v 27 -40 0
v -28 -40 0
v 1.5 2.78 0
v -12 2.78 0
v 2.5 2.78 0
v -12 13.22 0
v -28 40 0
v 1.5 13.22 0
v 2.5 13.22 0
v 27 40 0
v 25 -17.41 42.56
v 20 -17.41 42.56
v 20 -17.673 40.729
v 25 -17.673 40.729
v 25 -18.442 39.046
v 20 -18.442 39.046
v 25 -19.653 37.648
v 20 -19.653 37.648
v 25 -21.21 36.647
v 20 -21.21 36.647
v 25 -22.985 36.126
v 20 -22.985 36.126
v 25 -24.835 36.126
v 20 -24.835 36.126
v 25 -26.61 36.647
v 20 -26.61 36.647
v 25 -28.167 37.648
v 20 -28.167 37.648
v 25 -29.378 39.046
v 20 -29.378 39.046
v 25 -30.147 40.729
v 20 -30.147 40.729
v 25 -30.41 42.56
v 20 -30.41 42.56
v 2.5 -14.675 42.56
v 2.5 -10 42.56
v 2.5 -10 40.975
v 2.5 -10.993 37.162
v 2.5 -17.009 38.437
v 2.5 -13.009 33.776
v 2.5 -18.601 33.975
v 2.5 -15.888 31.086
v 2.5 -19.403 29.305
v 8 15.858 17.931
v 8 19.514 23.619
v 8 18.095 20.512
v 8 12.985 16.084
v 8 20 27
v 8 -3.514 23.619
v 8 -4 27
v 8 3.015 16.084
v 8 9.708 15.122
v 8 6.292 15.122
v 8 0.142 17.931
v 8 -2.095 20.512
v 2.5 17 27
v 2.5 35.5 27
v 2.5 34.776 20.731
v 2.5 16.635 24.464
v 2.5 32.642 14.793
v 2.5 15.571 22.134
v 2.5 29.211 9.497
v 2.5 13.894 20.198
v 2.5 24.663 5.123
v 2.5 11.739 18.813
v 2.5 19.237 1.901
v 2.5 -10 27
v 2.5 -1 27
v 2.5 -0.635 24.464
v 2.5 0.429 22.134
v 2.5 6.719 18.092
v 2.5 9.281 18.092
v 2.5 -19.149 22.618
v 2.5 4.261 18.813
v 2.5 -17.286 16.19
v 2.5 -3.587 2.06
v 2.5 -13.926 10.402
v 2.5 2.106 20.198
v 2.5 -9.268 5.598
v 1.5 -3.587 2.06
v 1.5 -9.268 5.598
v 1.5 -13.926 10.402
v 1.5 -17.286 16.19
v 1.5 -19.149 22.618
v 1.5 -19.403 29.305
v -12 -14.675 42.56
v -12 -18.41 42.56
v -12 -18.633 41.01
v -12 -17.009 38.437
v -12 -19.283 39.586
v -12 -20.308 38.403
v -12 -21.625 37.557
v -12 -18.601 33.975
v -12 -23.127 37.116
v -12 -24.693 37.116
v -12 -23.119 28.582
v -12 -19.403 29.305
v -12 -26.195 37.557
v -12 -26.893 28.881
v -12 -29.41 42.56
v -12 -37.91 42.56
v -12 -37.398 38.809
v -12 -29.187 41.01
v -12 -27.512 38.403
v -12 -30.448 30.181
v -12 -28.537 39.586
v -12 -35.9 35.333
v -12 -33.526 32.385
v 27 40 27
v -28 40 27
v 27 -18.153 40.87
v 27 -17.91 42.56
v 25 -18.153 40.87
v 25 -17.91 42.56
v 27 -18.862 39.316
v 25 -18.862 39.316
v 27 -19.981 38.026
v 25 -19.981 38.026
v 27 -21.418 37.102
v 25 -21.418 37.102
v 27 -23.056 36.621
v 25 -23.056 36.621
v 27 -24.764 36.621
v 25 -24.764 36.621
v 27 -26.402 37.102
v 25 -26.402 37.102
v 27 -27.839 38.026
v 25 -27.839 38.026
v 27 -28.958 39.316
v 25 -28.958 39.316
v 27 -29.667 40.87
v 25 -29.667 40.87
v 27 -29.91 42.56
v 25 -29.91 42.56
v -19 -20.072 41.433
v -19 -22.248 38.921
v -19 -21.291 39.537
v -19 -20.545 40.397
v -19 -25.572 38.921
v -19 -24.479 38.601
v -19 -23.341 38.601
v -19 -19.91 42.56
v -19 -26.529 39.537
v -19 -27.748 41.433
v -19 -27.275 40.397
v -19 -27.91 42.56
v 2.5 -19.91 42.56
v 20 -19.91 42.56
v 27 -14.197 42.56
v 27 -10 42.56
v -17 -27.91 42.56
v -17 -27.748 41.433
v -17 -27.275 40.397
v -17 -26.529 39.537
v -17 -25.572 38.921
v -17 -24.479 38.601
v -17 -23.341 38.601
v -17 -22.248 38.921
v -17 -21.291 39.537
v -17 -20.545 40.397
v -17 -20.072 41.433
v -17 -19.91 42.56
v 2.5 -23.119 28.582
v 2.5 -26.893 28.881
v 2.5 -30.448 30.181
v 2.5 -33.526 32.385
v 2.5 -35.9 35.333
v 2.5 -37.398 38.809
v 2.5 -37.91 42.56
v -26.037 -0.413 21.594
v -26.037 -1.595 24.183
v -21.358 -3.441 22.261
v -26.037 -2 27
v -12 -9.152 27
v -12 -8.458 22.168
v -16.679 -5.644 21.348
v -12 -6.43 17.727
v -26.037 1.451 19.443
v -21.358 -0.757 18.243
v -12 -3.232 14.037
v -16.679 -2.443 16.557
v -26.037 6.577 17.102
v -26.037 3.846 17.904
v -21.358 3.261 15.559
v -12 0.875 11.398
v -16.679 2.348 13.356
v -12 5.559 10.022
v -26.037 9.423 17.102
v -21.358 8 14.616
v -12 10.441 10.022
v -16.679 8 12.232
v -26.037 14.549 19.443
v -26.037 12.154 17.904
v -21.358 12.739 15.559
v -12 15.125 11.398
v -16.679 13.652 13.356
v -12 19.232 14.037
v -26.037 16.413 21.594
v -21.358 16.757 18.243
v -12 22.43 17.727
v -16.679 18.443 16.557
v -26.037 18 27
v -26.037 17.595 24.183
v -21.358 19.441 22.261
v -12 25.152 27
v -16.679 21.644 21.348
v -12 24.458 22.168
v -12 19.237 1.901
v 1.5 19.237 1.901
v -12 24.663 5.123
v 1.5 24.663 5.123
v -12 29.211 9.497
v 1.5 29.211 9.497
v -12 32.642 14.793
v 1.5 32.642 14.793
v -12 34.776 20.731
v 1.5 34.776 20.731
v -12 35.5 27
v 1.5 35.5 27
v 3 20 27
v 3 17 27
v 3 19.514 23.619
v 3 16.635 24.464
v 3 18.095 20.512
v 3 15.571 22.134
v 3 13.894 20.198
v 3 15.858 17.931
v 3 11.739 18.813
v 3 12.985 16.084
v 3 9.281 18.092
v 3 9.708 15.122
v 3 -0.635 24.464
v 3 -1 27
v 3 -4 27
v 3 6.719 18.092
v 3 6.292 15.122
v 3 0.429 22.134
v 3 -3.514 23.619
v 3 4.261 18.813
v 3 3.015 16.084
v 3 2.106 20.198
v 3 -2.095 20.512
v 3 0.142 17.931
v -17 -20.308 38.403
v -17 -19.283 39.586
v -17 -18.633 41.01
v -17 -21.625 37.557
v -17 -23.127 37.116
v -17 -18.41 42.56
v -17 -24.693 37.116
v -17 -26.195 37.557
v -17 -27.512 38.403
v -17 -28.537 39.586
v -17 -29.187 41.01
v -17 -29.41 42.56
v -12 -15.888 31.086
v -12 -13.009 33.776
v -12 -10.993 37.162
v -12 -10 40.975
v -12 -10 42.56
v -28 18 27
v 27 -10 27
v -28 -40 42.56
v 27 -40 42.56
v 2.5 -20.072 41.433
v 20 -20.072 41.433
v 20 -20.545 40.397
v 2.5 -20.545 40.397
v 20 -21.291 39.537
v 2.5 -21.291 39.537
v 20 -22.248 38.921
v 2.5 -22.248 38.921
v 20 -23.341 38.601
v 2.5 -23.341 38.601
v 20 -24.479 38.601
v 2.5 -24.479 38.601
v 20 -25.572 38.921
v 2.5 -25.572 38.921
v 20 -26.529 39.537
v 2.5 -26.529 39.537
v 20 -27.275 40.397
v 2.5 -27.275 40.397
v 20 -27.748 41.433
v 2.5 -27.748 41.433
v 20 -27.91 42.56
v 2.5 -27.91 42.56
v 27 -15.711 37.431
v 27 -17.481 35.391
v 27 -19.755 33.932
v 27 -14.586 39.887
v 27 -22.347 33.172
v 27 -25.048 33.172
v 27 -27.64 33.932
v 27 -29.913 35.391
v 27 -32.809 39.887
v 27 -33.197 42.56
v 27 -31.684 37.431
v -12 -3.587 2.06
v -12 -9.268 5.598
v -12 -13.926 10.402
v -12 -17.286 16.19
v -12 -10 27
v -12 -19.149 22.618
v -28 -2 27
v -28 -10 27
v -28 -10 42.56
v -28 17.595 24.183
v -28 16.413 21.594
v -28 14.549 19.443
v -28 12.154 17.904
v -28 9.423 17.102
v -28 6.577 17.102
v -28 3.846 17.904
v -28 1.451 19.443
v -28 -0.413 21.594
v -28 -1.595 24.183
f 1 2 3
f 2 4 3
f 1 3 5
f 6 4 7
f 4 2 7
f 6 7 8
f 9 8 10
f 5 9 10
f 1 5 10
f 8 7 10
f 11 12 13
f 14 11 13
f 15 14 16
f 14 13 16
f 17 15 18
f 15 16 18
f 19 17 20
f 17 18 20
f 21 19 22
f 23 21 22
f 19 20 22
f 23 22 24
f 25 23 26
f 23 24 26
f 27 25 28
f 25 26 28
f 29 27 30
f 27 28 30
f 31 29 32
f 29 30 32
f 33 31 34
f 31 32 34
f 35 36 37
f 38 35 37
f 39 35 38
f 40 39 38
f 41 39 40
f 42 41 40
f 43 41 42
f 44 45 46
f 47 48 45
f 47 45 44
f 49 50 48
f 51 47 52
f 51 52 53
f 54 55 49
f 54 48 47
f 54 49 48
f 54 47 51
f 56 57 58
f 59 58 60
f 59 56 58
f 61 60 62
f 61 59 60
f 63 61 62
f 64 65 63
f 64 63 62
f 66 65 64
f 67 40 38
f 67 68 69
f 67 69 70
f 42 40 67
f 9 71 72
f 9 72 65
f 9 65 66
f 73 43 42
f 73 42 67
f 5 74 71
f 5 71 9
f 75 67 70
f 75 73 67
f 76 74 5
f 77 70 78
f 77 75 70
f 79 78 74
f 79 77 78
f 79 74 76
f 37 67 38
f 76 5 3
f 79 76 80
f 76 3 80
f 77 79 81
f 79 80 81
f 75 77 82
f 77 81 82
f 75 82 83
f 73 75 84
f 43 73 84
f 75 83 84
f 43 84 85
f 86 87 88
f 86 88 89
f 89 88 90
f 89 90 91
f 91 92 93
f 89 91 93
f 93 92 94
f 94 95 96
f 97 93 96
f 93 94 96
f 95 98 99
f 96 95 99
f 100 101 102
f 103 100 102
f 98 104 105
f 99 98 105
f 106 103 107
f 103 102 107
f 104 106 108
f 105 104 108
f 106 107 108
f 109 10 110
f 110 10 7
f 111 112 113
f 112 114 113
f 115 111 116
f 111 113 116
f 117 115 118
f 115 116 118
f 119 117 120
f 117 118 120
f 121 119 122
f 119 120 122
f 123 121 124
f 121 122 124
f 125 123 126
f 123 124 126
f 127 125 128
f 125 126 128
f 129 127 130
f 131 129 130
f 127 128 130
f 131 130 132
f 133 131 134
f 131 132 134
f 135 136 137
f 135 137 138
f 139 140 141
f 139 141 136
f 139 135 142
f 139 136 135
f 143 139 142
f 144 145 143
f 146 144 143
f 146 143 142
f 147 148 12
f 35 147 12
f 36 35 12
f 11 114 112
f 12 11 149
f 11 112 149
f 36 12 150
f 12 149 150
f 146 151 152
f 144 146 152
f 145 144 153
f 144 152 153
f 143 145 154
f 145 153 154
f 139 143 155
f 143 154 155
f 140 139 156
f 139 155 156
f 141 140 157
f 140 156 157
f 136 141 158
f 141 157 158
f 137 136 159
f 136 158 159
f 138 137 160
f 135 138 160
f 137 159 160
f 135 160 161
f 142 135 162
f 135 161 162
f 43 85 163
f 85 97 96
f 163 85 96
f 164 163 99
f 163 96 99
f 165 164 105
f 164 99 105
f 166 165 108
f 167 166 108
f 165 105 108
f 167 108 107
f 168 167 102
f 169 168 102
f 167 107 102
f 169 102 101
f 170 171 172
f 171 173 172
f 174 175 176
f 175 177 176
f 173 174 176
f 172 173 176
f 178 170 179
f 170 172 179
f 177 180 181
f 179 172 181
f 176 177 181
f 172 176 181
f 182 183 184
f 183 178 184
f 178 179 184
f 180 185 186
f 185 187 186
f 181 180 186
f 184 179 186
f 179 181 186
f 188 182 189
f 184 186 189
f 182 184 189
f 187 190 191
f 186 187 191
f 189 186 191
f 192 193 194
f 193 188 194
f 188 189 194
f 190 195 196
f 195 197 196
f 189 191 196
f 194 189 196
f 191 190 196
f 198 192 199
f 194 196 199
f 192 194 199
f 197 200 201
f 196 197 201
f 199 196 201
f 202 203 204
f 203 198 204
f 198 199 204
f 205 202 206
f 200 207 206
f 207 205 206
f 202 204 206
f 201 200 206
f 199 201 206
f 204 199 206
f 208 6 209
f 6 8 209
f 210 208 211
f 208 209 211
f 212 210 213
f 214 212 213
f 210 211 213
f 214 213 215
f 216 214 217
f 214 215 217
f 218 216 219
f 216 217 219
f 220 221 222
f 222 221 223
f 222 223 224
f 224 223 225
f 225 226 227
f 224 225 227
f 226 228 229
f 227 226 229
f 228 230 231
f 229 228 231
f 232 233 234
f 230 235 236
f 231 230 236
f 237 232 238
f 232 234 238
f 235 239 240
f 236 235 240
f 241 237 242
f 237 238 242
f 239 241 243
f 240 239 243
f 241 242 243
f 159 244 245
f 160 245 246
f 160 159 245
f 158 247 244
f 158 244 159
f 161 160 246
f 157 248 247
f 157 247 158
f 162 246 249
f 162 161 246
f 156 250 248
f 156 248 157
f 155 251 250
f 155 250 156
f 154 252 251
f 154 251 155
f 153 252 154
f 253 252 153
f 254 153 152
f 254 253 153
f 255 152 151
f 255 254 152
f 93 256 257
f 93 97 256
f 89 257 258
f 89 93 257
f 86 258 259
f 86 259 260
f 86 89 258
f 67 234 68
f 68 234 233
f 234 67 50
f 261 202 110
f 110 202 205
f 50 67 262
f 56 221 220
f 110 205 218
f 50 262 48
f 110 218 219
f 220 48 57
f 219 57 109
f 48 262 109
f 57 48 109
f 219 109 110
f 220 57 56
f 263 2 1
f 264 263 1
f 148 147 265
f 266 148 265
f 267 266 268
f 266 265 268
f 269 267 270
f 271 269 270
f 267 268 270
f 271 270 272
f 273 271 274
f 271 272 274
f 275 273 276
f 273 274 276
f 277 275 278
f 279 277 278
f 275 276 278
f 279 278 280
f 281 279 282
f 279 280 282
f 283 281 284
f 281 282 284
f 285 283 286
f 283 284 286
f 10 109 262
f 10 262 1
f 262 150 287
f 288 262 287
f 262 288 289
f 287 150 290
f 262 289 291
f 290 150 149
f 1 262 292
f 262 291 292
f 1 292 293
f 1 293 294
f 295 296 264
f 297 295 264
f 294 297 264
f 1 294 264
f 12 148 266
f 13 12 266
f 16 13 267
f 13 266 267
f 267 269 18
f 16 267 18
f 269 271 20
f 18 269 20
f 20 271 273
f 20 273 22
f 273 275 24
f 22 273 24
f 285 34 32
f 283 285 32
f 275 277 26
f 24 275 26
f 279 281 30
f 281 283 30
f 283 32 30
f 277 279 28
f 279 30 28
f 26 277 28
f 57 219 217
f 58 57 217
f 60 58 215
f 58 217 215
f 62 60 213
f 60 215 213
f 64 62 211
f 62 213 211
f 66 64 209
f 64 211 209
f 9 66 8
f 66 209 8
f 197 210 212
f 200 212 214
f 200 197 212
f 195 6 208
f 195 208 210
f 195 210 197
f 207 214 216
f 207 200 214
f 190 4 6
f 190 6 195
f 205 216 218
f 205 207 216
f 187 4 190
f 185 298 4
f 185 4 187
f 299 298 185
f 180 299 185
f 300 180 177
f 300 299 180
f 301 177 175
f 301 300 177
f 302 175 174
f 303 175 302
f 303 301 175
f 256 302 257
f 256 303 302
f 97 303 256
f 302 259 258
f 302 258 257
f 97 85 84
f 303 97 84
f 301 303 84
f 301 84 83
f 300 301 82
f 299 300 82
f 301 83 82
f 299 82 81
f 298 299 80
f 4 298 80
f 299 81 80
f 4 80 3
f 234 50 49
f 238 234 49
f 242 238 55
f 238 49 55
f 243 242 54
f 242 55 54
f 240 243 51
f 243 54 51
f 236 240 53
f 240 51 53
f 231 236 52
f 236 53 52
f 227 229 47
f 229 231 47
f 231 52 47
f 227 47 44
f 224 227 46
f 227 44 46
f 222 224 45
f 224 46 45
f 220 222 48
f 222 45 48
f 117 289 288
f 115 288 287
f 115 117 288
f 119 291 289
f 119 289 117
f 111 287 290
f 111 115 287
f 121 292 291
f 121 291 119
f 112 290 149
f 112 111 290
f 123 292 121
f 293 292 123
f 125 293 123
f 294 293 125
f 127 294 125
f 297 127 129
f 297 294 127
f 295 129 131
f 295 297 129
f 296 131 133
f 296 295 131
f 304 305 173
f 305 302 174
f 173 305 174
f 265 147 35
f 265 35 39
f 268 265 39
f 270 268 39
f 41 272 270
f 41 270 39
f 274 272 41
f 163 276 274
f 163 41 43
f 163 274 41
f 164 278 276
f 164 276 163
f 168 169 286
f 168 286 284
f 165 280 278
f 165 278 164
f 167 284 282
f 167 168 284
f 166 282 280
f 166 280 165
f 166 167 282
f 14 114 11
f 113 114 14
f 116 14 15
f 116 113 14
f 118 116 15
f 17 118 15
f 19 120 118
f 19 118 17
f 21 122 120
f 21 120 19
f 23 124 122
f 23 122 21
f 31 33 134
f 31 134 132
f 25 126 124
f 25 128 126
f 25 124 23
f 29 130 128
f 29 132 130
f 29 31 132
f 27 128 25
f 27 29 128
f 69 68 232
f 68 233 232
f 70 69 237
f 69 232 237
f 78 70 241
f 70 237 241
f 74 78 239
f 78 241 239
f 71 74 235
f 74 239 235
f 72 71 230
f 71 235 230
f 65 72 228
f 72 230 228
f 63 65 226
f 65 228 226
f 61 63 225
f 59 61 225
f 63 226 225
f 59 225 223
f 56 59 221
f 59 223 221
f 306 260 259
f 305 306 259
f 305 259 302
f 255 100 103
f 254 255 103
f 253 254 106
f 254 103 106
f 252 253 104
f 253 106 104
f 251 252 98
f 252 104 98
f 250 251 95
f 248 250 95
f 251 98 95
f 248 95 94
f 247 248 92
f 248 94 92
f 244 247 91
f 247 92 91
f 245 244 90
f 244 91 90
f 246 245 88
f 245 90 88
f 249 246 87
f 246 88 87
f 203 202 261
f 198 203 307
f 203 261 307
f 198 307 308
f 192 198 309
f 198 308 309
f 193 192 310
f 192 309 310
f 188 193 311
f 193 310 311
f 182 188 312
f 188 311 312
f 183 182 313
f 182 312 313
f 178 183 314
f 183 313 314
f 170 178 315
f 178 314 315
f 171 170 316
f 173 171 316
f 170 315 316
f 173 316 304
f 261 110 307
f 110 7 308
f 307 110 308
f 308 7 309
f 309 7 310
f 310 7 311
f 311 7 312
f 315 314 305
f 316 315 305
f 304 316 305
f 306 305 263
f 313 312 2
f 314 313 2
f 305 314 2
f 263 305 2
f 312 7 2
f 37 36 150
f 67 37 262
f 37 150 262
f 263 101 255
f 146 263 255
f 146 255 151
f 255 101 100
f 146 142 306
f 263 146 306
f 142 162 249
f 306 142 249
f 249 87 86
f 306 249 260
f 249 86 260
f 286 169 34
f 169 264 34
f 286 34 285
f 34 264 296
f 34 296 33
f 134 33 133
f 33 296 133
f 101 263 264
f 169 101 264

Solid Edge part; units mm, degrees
sketch "Sketch1" plane through (0, 0, 0) normal (0, 0, 1) x (1, 0, 0)
  line L0 (-28, -40) -> (28, -40)
  line L1 (28, -40) -> (28, 40)
  line L2 (28, 40) -> (-28, 40)
  line L3 (-28, 40) -> (-28, -40)
  dimension "D1" = 56
  dimension "D2" = 80
extrude "Protrusion1" add sketch "Sketch1" along normal blind 60
sketch "Sketch2" plane through (28, 0, 30) normal (1, 0, 0) x (0, 1, 0)
  line L0 (-10, 30) -> (-10, -3)
  line L1 (-10, -3) -> (40, -3)
  dimension "D1" = 50
  dimension "D2" = 27
extrude "Extrusionsausschnitt_1" cut sketch "Sketch2" against normal blind 62 material side at (28, -9.95, 43.5)
sketch "Sketch3" plane through (28, 0, 30) normal (1, 0, 0) x (0, 1, 0)
  line L0 (-40, 12.56) -> (-10, 12.56)
  dimension "D1" = 42.56
extrude "Extrusionsausschnitt_2" cut sketch "Sketch3" against normal blind 92 material side at (28, -25, 42.61)
sketch "Sketch4" plane through (8, 0, 21.28) normal (-1, 0, 0) x (0, -1, 0)
  circle A0 centre (-8, 5.72) radius 12
  dimension "D1" = 24
  dimension "D2" = 32
extrude "Extrusionsausschnitt_3" cut sketch "Sketch4" along normal blind 5
sketch "Sketch5" plane through (3, 5.5, 20.5) normal (1, 0, 0) x (0, 1, 0)
  circle A0 centre (2.5, 6.5) radius 9
  dimension "D1" = 18
  dimension "D2" = 32
extrude "Extrusionsausschnitt_4" cut sketch "Sketch5" against normal blind 1.5
sketch "Sketch6" plane through (1.5, 5.5, 22.5) normal (1, 0, 0) x (0, 1, 0)
  circle A0 centre (2.5, 4.5) radius 27.5
  dimension "D1" = 55
  dimension "D2" = 32
extrude "Extrusionsausschnitt_5" cut sketch "Sketch6" against normal blind 13.5
sketch "Sketch7" plane through (1.5, 5.5, 21.28) normal (-1, 0, 0) x (0, 0, 1)
  circle A0 centre (5.72, 2.5) radius 27.5
  dimension "D1" = 55
  dimension "D2" = 32
extrude "Extrusionsausschnitt_6" cut sketch "Sketch7" against normal blind 1
sketch "Sketch8" plane through (0, 15, 27) normal (0, 0, 1) x (1, 0, 0)
  line L0 (-12, 10.1524) -> (-28, 2)
  line L1 (-12, 10.1524) -> (-12, -7)
revolve "RevolvedCutout1" cut sketch "Sketch8" angle 360 about axis through (-28, 8, 27) along (1, 0, 0) material side at (-19.9773, 21.0316, 27)
sketch "Sketch9" plane through (-28, 0, 21.28) normal (-1, 0, 0) x (0, -1, 0)
  circle A0 centre (-8, 5.72) radius 10
  dimension "D1" = 20
extrude "Cutout1" cut sketch "Sketch9" against normal up to vertex (16 mm away)
sketch "Sketch10" plane through (-12, 0, 21.28) normal (-1, 0, 0) x (0, 0, 1)
  circle A0 centre (21.28, -23.91) radius 14
  dimension "D1" = 16.09
  dimension "D2" = 28
extrude "Extrusionsausschnitt_8" cut sketch "Sketch10" against normal up to vertex (14.5 mm away)
sketch "Sketch11" plane through (-12, -0.75, 21.28) normal (1, 0, 0) x (0, 1, 0)
  circle A0 centre (-23.16, 21.28) radius 5.5
  dimension "D1" = 11
  dimension "D2" = 16.09
extrude "Extrusionsausschnitt_9" cut sketch "Sketch11" against normal blind 5
sketch "Sketch12" plane through (-17, -23.91, 39.81) normal (1, 0, 0) x (0, 1, 0)
  circle A0 centre (0, 2.75) radius 4
  dimension "D1" = 8
  dimension "D2" = 16.09
extrude "Extrusionsausschnitt_10" cut sketch "Sketch12" against normal blind 2
sketch "Sketch13" plane through (2.5, -0.75, 21.28) normal (-1, 0, 0) x (0, -1, 0)
  circle A0 centre (23.16, 21.28) radius 4
  dimension "D1" = 8
  dimension "D2" = 16.09
extrude "Extrusionsausschnitt_11" cut sketch "Sketch13" against normal blind 17.5
sketch "Sketch14" plane through (20, -23.91, 40.56) normal (-1, 0, 0) x (0, -1, 0)
  circle A0 centre (0, 2) radius 6.5
  dimension "D1" = 13
  dimension "D2" = 16.09
extrude "Extrusionsausschnitt_12" cut sketch "Sketch14" against normal blind 5
sketch "Sketch15" plane through (25, -23.91, 38.81) normal (-1, 0, 0) x (0, -1, 0)
  circle A0 centre (0, 3.75) radius 6
  dimension "D1" = 12
  dimension "D2" = 16.09
extrude "Extrusionsausschnitt_13" cut sketch "Sketch15" against normal blind 24
sketch "Sketch16" plane through (28, 0, 21.28) normal (1, 0, 0) x (0, 1, 0)
  circle A0 centre (-23.6974, 21.295) radius 9.5
  dimension "D1" = 19
extrude "Extrusionsausschnitt_14" cut sketch "Sketch16" against normal blind 1
sketch "Sketch17" plane through (15.25, -14.955, 42.56) normal (0, 0, 1) x (1, 0, 0)
  line L0 (11.75, 54.955) -> (11.75, -25.045)
  dimension "D1" = 1
extrude "Extrusionsausschnitt_15" cut sketch "Sketch17" against normal blind 100 material side at (27.05, 0, 42.56)
properties material "Aluminiumlegierung:3.0205, Al 99.0, EN-AW 1200"
